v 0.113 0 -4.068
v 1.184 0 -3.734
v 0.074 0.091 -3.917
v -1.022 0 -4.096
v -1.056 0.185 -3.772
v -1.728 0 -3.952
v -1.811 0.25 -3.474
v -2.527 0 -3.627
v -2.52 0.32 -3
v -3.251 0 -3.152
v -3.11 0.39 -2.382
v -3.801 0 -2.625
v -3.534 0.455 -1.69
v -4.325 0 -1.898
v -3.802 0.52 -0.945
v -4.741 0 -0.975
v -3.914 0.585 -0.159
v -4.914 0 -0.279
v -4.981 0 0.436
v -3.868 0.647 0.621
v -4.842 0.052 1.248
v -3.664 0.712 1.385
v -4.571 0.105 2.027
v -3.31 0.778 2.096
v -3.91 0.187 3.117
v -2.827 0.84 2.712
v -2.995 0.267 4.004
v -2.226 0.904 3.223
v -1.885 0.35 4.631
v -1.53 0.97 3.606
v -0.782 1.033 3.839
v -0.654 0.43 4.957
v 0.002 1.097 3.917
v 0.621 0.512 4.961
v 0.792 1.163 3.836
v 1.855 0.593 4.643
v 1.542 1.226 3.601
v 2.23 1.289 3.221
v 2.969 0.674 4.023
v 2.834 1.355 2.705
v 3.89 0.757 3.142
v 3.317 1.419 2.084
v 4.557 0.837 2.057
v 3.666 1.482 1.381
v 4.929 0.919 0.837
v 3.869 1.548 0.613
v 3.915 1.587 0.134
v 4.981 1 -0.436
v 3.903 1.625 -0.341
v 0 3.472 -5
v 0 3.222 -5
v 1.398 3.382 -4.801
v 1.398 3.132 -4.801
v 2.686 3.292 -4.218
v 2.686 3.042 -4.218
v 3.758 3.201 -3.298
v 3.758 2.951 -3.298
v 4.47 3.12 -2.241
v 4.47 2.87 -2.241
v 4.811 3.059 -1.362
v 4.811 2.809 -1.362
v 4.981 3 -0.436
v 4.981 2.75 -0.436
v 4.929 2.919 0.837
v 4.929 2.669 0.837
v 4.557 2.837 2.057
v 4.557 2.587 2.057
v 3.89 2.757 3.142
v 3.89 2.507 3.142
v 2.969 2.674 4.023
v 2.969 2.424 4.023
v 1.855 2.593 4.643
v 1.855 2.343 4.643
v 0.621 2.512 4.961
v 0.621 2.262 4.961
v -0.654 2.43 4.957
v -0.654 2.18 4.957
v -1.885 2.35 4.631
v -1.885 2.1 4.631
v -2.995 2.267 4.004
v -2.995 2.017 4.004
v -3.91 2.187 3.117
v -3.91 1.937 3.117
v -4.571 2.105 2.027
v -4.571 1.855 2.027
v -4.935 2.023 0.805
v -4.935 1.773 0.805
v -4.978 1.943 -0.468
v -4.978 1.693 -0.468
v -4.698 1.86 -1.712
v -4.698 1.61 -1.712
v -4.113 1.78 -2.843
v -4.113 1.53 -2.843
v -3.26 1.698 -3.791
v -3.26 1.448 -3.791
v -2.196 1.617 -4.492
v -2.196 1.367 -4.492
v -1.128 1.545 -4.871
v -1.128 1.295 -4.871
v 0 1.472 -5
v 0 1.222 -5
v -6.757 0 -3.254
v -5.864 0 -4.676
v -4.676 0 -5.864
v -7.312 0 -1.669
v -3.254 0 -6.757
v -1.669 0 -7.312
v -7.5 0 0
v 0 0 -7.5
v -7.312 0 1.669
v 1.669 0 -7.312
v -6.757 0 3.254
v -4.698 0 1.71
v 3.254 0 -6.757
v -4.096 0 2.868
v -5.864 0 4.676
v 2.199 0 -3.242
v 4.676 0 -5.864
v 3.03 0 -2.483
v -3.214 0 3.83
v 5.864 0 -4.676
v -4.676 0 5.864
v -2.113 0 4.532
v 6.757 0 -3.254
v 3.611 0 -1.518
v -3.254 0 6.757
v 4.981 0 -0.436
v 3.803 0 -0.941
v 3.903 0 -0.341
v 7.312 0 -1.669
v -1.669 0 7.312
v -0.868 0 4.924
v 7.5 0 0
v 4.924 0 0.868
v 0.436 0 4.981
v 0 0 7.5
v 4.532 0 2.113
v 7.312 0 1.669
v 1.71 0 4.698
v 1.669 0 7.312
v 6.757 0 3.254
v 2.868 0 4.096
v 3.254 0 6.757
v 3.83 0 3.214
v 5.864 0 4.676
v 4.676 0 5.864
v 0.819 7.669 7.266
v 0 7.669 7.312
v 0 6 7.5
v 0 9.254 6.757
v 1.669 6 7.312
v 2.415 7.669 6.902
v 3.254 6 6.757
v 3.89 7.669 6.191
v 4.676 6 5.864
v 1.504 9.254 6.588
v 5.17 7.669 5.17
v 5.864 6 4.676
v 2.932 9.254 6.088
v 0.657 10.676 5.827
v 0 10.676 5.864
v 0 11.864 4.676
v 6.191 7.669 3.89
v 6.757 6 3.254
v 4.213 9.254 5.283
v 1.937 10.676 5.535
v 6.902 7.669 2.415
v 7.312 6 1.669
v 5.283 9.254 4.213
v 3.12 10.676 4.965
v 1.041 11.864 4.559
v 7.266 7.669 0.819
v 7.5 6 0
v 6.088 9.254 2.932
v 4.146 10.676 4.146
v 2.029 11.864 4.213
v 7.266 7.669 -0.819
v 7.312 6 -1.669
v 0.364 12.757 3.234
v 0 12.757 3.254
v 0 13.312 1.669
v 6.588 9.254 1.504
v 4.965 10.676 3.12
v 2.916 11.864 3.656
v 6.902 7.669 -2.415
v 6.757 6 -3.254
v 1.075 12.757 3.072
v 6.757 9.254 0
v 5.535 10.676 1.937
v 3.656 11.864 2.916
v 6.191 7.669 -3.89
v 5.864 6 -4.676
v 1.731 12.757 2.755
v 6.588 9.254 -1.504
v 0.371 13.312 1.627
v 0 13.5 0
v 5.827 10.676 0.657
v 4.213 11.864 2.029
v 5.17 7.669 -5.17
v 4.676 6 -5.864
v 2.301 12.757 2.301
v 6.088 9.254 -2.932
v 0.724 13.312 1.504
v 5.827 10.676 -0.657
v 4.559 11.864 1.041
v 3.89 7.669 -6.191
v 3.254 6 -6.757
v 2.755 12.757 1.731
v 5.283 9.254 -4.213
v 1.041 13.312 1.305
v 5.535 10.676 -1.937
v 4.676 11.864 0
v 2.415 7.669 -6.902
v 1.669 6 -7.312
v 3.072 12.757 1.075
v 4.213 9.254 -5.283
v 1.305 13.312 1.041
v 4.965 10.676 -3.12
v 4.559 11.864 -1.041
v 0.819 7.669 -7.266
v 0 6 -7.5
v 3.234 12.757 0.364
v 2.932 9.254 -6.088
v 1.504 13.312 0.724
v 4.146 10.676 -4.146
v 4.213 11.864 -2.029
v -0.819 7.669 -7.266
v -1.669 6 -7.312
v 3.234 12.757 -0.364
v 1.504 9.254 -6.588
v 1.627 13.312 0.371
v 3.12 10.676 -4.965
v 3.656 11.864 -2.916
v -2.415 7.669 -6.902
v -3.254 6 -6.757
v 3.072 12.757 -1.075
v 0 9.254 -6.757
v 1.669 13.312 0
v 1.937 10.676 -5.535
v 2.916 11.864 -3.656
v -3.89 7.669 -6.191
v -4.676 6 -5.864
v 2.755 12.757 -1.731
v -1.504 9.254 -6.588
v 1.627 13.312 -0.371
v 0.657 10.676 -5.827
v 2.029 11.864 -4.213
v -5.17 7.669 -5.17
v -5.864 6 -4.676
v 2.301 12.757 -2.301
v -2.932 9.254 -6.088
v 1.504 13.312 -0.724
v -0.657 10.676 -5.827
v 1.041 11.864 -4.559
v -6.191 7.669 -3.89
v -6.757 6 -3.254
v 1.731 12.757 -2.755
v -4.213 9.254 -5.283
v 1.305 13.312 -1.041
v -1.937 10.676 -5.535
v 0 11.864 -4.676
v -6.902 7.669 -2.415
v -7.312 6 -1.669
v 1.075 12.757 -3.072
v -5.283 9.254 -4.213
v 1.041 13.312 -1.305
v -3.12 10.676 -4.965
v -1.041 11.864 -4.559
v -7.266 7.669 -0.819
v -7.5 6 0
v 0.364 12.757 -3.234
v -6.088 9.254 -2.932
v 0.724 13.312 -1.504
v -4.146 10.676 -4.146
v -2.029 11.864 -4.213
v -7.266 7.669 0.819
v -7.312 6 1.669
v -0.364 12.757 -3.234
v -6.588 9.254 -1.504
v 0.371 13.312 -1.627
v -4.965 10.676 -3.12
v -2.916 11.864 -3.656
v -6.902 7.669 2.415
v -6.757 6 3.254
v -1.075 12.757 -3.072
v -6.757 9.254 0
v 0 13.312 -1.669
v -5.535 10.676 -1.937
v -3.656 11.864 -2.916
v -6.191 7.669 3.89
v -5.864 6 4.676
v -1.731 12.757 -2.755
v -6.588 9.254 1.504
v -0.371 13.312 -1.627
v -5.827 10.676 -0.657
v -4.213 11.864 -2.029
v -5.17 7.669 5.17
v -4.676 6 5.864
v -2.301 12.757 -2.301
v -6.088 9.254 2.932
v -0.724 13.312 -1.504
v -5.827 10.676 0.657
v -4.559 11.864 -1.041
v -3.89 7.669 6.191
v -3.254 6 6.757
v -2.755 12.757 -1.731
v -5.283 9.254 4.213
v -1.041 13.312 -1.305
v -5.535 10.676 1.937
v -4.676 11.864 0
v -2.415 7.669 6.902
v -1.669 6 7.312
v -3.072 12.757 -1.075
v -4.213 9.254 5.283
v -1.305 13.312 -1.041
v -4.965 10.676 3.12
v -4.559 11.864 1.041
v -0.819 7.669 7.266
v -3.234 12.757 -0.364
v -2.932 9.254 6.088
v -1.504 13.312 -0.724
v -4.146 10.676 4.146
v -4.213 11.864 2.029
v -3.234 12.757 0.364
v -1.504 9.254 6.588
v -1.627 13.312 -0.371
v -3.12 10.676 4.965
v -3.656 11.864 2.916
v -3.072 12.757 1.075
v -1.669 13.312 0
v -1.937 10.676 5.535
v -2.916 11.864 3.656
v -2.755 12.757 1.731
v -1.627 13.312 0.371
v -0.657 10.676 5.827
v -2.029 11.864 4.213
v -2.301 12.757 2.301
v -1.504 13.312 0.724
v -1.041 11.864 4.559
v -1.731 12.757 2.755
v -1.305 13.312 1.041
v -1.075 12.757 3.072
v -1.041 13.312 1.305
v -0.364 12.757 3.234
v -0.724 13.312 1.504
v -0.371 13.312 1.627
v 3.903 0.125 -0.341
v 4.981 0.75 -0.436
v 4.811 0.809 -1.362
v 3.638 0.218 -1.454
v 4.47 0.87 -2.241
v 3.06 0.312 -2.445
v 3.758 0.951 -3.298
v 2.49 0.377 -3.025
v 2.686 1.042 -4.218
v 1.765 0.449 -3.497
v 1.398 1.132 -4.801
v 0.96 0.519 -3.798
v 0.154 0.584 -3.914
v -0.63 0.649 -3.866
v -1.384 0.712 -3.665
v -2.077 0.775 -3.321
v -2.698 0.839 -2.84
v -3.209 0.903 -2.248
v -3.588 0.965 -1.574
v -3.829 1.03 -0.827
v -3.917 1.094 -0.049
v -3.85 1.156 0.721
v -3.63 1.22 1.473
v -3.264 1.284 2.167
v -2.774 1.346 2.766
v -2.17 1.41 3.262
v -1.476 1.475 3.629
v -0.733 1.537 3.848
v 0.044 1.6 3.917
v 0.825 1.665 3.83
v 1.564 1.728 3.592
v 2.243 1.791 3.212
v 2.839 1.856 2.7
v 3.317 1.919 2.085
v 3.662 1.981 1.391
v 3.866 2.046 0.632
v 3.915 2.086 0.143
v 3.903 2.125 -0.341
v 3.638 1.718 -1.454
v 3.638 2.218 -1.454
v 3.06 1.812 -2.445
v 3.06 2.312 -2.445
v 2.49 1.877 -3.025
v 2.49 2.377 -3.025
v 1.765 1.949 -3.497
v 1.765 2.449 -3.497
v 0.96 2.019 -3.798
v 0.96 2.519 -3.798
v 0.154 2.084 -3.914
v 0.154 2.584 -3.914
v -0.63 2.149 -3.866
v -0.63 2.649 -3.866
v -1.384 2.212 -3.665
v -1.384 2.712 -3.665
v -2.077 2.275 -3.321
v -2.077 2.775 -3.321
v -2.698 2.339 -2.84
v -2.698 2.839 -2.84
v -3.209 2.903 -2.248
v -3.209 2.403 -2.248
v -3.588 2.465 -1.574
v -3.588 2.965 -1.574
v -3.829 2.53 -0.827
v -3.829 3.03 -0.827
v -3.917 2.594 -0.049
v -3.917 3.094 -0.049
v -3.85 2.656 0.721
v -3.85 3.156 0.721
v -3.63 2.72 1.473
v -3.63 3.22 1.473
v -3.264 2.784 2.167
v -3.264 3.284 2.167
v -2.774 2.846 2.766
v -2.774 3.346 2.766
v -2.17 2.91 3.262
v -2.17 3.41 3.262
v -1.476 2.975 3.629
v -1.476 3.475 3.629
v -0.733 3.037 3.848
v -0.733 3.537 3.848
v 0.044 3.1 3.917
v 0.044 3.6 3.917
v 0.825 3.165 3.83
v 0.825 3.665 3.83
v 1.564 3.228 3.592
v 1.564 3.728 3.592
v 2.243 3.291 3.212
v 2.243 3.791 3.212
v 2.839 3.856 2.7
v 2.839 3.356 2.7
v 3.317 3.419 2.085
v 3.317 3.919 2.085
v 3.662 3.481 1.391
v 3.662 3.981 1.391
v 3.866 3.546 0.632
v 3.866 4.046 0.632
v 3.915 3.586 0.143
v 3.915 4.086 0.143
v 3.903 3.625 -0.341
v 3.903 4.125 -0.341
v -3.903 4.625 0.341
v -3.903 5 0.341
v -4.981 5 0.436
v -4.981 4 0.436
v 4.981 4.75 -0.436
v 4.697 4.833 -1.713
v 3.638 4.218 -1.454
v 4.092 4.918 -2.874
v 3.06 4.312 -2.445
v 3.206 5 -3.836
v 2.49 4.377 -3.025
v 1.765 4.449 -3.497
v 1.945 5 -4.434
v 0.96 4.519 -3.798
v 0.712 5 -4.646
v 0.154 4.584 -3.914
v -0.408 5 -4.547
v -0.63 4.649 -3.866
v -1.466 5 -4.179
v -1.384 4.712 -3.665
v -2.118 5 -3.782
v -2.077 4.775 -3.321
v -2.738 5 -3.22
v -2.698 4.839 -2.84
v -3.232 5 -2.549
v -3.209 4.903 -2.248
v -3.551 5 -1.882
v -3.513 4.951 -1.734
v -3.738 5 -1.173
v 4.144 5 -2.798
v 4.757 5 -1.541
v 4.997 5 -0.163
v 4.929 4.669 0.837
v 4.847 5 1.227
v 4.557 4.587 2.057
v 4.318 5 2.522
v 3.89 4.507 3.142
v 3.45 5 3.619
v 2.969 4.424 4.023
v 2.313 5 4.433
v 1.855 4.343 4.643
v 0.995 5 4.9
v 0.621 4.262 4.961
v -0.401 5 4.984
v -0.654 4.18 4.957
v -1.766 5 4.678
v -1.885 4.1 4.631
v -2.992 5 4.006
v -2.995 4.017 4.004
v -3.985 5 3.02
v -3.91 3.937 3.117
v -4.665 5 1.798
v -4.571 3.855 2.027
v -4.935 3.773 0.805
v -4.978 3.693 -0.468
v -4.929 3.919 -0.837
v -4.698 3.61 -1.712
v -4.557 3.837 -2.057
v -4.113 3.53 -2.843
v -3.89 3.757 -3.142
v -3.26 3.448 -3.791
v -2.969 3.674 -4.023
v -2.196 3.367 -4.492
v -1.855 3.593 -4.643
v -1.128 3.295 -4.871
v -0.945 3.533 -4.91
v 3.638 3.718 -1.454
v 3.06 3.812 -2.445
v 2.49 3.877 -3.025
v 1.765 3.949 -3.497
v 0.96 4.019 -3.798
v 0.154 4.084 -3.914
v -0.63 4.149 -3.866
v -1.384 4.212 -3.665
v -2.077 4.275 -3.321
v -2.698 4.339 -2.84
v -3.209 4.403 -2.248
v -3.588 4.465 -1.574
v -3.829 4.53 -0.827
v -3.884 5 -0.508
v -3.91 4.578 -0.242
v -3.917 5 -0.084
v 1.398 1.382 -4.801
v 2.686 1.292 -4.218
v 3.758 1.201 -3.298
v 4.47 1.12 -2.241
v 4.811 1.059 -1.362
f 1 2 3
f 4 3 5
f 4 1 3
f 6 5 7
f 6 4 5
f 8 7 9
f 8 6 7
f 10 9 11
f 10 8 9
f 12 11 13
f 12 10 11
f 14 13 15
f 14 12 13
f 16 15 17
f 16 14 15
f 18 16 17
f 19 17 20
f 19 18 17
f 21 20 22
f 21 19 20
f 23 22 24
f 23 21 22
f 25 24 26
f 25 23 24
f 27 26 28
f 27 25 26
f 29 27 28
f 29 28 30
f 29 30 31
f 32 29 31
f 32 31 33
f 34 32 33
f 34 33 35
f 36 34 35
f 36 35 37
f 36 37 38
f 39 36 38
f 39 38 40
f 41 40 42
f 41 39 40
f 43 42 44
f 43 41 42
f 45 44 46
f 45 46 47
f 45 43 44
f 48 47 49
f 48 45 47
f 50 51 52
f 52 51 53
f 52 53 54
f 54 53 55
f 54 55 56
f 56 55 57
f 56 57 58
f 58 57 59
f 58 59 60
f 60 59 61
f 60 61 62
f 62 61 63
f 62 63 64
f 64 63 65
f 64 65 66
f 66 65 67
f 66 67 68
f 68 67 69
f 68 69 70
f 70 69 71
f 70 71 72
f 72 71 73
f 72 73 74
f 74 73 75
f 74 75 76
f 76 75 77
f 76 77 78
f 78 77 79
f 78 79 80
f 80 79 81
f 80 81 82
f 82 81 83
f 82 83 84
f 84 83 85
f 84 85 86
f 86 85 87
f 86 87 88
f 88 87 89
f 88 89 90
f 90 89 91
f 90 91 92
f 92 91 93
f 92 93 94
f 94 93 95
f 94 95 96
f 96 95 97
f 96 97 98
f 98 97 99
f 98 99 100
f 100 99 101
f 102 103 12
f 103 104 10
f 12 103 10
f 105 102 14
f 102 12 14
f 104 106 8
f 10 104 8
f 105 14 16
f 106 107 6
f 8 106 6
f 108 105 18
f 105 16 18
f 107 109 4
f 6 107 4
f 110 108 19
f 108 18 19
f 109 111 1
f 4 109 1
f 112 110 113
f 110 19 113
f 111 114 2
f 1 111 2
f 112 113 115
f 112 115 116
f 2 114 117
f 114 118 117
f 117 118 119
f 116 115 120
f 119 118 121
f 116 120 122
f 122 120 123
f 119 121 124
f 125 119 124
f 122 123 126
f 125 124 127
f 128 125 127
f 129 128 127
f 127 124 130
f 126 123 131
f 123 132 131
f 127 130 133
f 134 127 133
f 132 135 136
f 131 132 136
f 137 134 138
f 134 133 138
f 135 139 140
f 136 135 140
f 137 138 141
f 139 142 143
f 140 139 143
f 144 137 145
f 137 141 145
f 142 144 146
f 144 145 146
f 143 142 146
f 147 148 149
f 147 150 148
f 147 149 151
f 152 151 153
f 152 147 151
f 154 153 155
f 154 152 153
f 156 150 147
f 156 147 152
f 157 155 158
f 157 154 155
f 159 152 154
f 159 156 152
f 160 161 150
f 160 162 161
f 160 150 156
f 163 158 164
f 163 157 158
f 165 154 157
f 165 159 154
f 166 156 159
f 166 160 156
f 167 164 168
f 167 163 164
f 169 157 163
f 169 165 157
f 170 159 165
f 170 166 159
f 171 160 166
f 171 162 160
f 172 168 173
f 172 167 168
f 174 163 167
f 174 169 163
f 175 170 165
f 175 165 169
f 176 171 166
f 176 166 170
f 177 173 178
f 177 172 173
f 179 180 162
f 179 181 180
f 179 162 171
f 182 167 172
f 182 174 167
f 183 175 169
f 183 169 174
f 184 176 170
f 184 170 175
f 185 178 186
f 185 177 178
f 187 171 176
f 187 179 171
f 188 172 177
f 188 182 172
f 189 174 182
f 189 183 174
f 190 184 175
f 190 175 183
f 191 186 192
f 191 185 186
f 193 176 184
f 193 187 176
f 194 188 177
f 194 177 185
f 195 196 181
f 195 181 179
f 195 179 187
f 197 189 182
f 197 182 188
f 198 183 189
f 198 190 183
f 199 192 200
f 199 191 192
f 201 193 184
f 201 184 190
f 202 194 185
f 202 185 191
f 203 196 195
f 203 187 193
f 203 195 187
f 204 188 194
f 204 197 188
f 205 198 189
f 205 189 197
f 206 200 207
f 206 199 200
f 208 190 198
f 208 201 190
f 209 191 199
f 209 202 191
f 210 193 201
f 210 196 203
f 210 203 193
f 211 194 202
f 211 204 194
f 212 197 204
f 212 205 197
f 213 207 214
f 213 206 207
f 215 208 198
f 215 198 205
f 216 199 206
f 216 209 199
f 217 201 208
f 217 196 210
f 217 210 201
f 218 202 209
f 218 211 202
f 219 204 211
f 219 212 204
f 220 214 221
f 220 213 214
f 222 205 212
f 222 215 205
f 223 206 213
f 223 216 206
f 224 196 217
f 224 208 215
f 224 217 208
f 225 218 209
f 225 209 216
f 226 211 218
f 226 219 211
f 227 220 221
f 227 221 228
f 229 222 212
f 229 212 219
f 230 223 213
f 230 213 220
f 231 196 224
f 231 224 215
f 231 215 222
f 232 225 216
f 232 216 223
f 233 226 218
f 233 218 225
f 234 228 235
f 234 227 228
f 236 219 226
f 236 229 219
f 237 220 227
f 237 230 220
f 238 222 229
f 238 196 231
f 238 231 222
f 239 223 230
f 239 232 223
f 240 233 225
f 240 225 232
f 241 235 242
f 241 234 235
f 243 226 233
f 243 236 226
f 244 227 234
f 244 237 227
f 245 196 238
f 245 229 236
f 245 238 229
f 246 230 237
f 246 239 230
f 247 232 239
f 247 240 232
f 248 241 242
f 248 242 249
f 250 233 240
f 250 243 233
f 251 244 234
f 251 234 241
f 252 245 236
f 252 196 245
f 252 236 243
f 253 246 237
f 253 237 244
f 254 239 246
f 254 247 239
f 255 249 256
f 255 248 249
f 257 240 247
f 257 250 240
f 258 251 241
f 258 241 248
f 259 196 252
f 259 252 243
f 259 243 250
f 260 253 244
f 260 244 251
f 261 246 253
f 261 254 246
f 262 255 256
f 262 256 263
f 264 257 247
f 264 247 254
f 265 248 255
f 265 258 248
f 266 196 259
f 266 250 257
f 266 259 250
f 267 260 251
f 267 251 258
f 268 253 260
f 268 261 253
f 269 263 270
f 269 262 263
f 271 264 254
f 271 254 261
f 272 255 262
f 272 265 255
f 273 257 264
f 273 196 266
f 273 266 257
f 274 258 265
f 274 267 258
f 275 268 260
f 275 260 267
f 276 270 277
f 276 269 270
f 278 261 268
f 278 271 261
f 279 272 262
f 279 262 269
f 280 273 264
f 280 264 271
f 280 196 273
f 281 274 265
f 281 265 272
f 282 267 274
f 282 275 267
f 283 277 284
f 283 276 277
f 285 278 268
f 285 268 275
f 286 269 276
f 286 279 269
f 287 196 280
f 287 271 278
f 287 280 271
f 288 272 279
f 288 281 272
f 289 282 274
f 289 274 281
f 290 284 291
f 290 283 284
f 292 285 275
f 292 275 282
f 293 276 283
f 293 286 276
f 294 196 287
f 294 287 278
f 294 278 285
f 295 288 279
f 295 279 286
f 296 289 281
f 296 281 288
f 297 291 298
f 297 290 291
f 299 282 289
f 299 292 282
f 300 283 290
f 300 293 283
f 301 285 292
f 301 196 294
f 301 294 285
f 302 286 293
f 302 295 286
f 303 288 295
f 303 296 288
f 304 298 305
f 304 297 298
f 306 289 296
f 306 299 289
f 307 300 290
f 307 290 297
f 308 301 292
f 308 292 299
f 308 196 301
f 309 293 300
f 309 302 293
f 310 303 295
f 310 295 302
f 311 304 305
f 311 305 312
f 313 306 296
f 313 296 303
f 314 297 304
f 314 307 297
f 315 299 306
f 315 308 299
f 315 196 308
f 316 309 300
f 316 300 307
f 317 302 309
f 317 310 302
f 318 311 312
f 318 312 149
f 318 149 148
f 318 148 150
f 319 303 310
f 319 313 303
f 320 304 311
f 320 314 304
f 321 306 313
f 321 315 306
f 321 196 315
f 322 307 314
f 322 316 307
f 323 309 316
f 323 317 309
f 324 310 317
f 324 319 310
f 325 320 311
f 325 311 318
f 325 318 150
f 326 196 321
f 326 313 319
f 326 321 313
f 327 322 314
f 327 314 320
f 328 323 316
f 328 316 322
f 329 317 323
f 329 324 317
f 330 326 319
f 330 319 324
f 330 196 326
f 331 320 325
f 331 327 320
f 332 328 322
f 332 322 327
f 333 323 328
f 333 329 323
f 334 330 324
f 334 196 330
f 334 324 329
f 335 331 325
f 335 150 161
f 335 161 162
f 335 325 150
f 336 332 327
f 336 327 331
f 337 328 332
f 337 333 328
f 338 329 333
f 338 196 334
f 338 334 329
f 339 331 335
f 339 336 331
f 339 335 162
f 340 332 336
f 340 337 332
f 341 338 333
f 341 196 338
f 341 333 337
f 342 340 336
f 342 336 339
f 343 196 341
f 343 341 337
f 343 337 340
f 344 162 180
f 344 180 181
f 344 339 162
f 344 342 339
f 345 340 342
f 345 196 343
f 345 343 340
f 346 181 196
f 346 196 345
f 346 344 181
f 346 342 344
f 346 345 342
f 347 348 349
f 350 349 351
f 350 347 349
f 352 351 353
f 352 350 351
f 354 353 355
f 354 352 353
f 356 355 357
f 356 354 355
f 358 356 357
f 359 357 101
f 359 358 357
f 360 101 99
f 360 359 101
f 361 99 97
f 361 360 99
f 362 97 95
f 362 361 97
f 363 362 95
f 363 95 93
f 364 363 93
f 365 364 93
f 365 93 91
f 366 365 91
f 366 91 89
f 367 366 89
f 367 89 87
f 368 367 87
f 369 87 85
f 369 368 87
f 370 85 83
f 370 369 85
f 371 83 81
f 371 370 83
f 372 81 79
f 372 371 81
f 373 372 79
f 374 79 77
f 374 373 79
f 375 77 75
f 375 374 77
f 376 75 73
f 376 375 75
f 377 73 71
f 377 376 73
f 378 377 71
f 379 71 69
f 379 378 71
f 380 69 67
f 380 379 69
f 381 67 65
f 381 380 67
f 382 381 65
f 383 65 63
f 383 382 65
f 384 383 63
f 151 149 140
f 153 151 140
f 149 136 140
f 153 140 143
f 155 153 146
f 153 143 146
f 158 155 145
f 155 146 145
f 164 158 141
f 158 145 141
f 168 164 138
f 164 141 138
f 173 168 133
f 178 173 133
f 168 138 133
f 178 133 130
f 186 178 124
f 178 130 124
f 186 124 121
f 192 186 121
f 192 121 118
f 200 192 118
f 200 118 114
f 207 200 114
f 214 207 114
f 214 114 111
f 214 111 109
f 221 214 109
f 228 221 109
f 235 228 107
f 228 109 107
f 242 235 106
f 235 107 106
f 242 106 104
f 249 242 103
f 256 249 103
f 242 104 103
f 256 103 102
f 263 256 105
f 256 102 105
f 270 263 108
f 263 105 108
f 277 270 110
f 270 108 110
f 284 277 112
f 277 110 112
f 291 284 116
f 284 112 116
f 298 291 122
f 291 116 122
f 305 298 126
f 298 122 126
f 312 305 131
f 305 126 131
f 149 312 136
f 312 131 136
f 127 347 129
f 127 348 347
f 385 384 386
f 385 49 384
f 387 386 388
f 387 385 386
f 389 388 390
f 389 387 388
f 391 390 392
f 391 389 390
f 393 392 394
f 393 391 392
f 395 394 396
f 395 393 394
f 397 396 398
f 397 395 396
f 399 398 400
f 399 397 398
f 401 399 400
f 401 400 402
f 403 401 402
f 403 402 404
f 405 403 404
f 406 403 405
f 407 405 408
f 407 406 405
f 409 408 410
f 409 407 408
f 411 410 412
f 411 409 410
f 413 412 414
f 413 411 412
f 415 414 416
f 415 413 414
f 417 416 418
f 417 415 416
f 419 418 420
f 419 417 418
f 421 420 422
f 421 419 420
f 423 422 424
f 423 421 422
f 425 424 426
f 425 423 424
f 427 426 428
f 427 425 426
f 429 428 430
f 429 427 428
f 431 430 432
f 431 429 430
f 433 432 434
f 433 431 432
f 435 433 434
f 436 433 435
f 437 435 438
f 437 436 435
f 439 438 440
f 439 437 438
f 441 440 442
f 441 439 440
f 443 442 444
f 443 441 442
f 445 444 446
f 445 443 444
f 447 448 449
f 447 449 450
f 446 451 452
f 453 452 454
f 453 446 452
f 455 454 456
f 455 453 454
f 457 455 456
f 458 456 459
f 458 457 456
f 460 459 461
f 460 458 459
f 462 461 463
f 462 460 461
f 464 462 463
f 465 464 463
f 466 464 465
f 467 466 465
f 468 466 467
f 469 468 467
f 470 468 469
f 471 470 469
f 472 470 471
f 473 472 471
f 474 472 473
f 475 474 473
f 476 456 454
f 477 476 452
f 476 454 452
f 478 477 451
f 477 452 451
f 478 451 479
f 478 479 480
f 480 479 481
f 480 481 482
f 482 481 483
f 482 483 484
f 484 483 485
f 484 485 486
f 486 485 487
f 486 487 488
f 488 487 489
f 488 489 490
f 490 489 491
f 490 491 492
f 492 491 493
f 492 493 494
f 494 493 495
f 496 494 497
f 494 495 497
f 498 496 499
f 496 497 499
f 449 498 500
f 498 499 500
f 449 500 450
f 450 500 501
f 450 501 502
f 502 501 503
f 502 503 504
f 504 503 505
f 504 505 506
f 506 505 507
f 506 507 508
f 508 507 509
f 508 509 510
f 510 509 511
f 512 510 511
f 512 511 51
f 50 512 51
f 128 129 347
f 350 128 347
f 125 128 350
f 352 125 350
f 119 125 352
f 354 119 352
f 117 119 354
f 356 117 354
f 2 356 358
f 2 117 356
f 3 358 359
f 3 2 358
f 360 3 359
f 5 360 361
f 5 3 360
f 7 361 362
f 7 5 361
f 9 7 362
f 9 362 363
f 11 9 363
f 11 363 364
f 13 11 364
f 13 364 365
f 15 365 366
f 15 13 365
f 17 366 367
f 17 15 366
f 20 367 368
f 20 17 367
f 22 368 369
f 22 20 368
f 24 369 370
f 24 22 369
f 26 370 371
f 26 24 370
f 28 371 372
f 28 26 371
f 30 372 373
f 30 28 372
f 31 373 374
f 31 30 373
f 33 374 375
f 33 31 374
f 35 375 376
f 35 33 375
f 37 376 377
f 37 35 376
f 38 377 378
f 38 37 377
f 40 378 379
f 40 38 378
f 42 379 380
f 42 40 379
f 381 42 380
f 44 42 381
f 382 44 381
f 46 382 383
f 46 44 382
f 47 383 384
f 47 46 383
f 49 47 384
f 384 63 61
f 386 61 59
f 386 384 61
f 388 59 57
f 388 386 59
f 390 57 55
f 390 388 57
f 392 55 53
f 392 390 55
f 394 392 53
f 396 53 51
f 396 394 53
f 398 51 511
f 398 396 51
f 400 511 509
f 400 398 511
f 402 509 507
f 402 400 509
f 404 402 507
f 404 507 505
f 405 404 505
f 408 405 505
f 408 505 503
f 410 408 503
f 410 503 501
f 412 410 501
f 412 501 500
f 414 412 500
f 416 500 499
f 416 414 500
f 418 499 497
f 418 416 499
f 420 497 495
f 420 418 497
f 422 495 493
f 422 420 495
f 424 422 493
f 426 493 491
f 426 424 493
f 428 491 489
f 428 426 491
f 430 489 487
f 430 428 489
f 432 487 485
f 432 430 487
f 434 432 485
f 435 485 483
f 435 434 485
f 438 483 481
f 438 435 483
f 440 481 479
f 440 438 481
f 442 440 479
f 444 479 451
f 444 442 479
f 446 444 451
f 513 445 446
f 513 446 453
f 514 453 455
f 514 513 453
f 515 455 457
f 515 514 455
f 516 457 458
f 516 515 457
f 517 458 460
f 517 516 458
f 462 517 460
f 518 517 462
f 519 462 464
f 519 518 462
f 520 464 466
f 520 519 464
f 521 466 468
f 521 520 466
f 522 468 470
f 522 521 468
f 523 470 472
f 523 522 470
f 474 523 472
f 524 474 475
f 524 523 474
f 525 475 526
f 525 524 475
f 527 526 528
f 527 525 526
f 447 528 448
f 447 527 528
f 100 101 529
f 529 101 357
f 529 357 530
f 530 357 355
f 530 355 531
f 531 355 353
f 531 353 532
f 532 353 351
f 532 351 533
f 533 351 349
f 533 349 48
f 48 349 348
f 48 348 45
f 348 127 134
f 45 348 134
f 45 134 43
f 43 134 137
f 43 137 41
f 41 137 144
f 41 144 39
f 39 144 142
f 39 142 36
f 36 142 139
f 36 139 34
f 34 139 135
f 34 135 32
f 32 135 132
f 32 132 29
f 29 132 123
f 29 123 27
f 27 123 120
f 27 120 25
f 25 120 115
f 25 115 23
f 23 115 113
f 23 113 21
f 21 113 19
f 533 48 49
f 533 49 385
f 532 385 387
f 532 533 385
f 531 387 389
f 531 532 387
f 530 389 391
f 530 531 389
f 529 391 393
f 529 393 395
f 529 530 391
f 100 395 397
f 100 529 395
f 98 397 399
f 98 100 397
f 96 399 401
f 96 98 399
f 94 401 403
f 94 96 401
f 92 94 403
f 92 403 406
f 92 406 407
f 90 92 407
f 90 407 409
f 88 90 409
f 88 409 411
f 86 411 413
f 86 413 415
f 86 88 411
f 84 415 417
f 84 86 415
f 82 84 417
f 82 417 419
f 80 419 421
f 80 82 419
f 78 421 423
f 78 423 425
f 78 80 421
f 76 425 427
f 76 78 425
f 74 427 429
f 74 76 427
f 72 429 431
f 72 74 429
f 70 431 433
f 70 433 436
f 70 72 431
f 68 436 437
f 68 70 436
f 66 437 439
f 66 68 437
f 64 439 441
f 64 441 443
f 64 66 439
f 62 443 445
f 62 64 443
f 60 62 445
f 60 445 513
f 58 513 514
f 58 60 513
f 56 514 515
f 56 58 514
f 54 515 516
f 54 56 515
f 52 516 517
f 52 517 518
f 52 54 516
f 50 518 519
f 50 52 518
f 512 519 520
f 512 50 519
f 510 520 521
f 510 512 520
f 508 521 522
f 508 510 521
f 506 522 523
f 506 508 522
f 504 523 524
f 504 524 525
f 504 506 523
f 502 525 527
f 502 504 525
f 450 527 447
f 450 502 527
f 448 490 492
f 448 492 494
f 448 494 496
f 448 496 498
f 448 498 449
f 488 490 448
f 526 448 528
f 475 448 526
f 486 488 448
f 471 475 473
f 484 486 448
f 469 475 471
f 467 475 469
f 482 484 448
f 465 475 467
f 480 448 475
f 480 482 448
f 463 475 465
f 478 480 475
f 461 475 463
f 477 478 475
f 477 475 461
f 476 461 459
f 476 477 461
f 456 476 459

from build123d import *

# Parameters (mm, degrees)
SKETCH2_R           = 7.5
BOSS_EXTRUDE1_DEPTH = 13.5
SKETCH3_R           = 5
CUT_EXTRUDE1_DEPTH  = 5
FILLET1_R           = 7.5
THREAD1_PITCH       = 2
SKETCH10_W          = 14.918293933
SKETCH10_H          = 11.930208352
CUT_EXTRUDE2_DEPTH  = 5


with BuildPart() as part:
    # Sketch2 → Boss-Extrude1 (new body)
    with BuildSketch(Plane(origin=(0, 0, 0), x_dir=(1, 0, 0), z_dir=(0, 1, 0))):
        with Locations(Location((0, 0, 0), (0, 0, 270))):
            Circle(SKETCH2_R)
    extrude(amount=BOSS_EXTRUDE1_DEPTH)

    # Sketch3 → Cut-Extrude1 (cut)
    with BuildSketch(Plane(origin=(0, 0, 0), x_dir=(-1, 0, 0), z_dir=(0, -1, 0))):
        with Locations(Location((0, 0, 0), (0, 0, 90))):
            Circle(SKETCH3_R)
    extrude(amount=-CUT_EXTRUDE1_DEPTH, mode=Mode.SUBTRACT)

    # Fillet1
    fillet1_edges = [part.edges().sort_by_distance(p)[0] for p in [
        (0, 13.5, -7.5),
    ]]
    fillet(fillet1_edges, radius=FILLET1_R)

    # Thread1: the profile of Thread Profile2 profile screwed along a right-hand helix of 2.5 turns, 10 arcs to a turn; built about Z, then put on its axis
    thread1_z = Axis((0, 0, 0), (0, 0, 1))
    thread1_corners = [(5.0003, -1e-09, -0.000173205), (5.0003, -1e-09, 1.7501732), (3.91746825, -1e-09, 1.124999997), (3.91746825, -1e-09, 0.624999997)]
    with BuildLine(mode=Mode.PRIVATE) as thread1_profile:
        Line(thread1_corners[0], thread1_corners[1])
        Line(thread1_corners[1], thread1_corners[2])
        Line(thread1_corners[2], thread1_corners[3])
        Line(thread1_corners[3], thread1_corners[0])
    thread1_cap = Face(thread1_profile.wire())
    thread1_turn_angles = [0, 18, 36, 54, 72, 90, 108, 126, 144, 162, 180, 198, 216, 234, 252, 270, 288, 306, 324, 342, 360]
    thread1_turn_weights = [1, 0.9510565162951535, 1, 0.9510565162951535, 1, 0.9510565162951535, 1, 0.9510565162951535, 1, 0.9510565162951535, 1, 0.9510565162951535, 1, 0.9510565162951535, 1, 0.9510565162951535, 1, 0.9510565162951535, 1, 0.9510565162951535, 1]
    thread1_turn_rails = [Edge.make_bspline([Vector(p[0], p[1], 0).rotate(thread1_z, thread1_turn_angles[k]) / thread1_turn_weights[k] + Vector(0, 0, p[2] + THREAD1_PITCH * thread1_turn_angles[k] / 360) for k in range(21)], [0, 0, 0, 1, 1, 2, 2, 3, 3, 4, 4, 5, 5, 6, 6, 7, 7, 8, 8, 9, 9, 10, 10, 10], 2, thread1_turn_weights) for p in thread1_corners]
    thread1_turn_sides = [Face.make_surface_from_curves(thread1_turn_rails[p[0]], thread1_turn_rails[p[1]]) for p in [(0, 1), (1, 2), (2, 3), (3, 0)]]
    thread1_last_angles = [720, 738, 756, 774, 792, 810, 828, 846, 864, 882, 900]
    thread1_last_weights = [1, 0.9510565162951535, 1, 0.9510565162951535, 1, 0.9510565162951535, 1, 0.9510565162951535, 1, 0.9510565162951539, 1]
    thread1_last_rails = [Edge.make_bspline([Vector(p[0], p[1], 0).rotate(thread1_z, thread1_last_angles[k]) / thread1_last_weights[k] + Vector(0, 0, p[2] + THREAD1_PITCH * thread1_last_angles[k] / 360) for k in range(11)], [0, 0, 0, 1, 1, 2, 2, 3, 3, 4, 4, 5, 5, 5], 2, thread1_last_weights) for p in thread1_corners]
    thread1_last_sides = [Face.make_surface_from_curves(thread1_last_rails[p[0]], thread1_last_rails[p[1]]) for p in [(0, 1), (1, 2), (2, 3), (3, 0)]]
    thread1 = Plane(origin=(0, -1, 0), x_dir=(0.996194698, 0, -0.087155743), z_dir=(0, 1, 0)) * Solid(Shell([*[p.moved(Location((0, 0, THREAD1_PITCH * i))) for i in range(2) for p in thread1_turn_sides], *thread1_last_sides, thread1_cap, thread1_cap.rotate(thread1_z, 900).moved(Location((0, 0, THREAD1_PITCH * 900 / 360)))]))
    add(thread1)

    # Sketch10 → Cut-Extrude2 (cut)
    with BuildSketch(Plane(origin=(0, 0, 0), x_dir=(-1, 0, 0), z_dir=(0, -1, 0))):
        with Locations((1.239502166, -0.263539638)):
            Rectangle(SKETCH10_W, SKETCH10_H)
    extrude(amount=CUT_EXTRUDE2_DEPTH, mode=Mode.SUBTRACT)


solid = part.part
